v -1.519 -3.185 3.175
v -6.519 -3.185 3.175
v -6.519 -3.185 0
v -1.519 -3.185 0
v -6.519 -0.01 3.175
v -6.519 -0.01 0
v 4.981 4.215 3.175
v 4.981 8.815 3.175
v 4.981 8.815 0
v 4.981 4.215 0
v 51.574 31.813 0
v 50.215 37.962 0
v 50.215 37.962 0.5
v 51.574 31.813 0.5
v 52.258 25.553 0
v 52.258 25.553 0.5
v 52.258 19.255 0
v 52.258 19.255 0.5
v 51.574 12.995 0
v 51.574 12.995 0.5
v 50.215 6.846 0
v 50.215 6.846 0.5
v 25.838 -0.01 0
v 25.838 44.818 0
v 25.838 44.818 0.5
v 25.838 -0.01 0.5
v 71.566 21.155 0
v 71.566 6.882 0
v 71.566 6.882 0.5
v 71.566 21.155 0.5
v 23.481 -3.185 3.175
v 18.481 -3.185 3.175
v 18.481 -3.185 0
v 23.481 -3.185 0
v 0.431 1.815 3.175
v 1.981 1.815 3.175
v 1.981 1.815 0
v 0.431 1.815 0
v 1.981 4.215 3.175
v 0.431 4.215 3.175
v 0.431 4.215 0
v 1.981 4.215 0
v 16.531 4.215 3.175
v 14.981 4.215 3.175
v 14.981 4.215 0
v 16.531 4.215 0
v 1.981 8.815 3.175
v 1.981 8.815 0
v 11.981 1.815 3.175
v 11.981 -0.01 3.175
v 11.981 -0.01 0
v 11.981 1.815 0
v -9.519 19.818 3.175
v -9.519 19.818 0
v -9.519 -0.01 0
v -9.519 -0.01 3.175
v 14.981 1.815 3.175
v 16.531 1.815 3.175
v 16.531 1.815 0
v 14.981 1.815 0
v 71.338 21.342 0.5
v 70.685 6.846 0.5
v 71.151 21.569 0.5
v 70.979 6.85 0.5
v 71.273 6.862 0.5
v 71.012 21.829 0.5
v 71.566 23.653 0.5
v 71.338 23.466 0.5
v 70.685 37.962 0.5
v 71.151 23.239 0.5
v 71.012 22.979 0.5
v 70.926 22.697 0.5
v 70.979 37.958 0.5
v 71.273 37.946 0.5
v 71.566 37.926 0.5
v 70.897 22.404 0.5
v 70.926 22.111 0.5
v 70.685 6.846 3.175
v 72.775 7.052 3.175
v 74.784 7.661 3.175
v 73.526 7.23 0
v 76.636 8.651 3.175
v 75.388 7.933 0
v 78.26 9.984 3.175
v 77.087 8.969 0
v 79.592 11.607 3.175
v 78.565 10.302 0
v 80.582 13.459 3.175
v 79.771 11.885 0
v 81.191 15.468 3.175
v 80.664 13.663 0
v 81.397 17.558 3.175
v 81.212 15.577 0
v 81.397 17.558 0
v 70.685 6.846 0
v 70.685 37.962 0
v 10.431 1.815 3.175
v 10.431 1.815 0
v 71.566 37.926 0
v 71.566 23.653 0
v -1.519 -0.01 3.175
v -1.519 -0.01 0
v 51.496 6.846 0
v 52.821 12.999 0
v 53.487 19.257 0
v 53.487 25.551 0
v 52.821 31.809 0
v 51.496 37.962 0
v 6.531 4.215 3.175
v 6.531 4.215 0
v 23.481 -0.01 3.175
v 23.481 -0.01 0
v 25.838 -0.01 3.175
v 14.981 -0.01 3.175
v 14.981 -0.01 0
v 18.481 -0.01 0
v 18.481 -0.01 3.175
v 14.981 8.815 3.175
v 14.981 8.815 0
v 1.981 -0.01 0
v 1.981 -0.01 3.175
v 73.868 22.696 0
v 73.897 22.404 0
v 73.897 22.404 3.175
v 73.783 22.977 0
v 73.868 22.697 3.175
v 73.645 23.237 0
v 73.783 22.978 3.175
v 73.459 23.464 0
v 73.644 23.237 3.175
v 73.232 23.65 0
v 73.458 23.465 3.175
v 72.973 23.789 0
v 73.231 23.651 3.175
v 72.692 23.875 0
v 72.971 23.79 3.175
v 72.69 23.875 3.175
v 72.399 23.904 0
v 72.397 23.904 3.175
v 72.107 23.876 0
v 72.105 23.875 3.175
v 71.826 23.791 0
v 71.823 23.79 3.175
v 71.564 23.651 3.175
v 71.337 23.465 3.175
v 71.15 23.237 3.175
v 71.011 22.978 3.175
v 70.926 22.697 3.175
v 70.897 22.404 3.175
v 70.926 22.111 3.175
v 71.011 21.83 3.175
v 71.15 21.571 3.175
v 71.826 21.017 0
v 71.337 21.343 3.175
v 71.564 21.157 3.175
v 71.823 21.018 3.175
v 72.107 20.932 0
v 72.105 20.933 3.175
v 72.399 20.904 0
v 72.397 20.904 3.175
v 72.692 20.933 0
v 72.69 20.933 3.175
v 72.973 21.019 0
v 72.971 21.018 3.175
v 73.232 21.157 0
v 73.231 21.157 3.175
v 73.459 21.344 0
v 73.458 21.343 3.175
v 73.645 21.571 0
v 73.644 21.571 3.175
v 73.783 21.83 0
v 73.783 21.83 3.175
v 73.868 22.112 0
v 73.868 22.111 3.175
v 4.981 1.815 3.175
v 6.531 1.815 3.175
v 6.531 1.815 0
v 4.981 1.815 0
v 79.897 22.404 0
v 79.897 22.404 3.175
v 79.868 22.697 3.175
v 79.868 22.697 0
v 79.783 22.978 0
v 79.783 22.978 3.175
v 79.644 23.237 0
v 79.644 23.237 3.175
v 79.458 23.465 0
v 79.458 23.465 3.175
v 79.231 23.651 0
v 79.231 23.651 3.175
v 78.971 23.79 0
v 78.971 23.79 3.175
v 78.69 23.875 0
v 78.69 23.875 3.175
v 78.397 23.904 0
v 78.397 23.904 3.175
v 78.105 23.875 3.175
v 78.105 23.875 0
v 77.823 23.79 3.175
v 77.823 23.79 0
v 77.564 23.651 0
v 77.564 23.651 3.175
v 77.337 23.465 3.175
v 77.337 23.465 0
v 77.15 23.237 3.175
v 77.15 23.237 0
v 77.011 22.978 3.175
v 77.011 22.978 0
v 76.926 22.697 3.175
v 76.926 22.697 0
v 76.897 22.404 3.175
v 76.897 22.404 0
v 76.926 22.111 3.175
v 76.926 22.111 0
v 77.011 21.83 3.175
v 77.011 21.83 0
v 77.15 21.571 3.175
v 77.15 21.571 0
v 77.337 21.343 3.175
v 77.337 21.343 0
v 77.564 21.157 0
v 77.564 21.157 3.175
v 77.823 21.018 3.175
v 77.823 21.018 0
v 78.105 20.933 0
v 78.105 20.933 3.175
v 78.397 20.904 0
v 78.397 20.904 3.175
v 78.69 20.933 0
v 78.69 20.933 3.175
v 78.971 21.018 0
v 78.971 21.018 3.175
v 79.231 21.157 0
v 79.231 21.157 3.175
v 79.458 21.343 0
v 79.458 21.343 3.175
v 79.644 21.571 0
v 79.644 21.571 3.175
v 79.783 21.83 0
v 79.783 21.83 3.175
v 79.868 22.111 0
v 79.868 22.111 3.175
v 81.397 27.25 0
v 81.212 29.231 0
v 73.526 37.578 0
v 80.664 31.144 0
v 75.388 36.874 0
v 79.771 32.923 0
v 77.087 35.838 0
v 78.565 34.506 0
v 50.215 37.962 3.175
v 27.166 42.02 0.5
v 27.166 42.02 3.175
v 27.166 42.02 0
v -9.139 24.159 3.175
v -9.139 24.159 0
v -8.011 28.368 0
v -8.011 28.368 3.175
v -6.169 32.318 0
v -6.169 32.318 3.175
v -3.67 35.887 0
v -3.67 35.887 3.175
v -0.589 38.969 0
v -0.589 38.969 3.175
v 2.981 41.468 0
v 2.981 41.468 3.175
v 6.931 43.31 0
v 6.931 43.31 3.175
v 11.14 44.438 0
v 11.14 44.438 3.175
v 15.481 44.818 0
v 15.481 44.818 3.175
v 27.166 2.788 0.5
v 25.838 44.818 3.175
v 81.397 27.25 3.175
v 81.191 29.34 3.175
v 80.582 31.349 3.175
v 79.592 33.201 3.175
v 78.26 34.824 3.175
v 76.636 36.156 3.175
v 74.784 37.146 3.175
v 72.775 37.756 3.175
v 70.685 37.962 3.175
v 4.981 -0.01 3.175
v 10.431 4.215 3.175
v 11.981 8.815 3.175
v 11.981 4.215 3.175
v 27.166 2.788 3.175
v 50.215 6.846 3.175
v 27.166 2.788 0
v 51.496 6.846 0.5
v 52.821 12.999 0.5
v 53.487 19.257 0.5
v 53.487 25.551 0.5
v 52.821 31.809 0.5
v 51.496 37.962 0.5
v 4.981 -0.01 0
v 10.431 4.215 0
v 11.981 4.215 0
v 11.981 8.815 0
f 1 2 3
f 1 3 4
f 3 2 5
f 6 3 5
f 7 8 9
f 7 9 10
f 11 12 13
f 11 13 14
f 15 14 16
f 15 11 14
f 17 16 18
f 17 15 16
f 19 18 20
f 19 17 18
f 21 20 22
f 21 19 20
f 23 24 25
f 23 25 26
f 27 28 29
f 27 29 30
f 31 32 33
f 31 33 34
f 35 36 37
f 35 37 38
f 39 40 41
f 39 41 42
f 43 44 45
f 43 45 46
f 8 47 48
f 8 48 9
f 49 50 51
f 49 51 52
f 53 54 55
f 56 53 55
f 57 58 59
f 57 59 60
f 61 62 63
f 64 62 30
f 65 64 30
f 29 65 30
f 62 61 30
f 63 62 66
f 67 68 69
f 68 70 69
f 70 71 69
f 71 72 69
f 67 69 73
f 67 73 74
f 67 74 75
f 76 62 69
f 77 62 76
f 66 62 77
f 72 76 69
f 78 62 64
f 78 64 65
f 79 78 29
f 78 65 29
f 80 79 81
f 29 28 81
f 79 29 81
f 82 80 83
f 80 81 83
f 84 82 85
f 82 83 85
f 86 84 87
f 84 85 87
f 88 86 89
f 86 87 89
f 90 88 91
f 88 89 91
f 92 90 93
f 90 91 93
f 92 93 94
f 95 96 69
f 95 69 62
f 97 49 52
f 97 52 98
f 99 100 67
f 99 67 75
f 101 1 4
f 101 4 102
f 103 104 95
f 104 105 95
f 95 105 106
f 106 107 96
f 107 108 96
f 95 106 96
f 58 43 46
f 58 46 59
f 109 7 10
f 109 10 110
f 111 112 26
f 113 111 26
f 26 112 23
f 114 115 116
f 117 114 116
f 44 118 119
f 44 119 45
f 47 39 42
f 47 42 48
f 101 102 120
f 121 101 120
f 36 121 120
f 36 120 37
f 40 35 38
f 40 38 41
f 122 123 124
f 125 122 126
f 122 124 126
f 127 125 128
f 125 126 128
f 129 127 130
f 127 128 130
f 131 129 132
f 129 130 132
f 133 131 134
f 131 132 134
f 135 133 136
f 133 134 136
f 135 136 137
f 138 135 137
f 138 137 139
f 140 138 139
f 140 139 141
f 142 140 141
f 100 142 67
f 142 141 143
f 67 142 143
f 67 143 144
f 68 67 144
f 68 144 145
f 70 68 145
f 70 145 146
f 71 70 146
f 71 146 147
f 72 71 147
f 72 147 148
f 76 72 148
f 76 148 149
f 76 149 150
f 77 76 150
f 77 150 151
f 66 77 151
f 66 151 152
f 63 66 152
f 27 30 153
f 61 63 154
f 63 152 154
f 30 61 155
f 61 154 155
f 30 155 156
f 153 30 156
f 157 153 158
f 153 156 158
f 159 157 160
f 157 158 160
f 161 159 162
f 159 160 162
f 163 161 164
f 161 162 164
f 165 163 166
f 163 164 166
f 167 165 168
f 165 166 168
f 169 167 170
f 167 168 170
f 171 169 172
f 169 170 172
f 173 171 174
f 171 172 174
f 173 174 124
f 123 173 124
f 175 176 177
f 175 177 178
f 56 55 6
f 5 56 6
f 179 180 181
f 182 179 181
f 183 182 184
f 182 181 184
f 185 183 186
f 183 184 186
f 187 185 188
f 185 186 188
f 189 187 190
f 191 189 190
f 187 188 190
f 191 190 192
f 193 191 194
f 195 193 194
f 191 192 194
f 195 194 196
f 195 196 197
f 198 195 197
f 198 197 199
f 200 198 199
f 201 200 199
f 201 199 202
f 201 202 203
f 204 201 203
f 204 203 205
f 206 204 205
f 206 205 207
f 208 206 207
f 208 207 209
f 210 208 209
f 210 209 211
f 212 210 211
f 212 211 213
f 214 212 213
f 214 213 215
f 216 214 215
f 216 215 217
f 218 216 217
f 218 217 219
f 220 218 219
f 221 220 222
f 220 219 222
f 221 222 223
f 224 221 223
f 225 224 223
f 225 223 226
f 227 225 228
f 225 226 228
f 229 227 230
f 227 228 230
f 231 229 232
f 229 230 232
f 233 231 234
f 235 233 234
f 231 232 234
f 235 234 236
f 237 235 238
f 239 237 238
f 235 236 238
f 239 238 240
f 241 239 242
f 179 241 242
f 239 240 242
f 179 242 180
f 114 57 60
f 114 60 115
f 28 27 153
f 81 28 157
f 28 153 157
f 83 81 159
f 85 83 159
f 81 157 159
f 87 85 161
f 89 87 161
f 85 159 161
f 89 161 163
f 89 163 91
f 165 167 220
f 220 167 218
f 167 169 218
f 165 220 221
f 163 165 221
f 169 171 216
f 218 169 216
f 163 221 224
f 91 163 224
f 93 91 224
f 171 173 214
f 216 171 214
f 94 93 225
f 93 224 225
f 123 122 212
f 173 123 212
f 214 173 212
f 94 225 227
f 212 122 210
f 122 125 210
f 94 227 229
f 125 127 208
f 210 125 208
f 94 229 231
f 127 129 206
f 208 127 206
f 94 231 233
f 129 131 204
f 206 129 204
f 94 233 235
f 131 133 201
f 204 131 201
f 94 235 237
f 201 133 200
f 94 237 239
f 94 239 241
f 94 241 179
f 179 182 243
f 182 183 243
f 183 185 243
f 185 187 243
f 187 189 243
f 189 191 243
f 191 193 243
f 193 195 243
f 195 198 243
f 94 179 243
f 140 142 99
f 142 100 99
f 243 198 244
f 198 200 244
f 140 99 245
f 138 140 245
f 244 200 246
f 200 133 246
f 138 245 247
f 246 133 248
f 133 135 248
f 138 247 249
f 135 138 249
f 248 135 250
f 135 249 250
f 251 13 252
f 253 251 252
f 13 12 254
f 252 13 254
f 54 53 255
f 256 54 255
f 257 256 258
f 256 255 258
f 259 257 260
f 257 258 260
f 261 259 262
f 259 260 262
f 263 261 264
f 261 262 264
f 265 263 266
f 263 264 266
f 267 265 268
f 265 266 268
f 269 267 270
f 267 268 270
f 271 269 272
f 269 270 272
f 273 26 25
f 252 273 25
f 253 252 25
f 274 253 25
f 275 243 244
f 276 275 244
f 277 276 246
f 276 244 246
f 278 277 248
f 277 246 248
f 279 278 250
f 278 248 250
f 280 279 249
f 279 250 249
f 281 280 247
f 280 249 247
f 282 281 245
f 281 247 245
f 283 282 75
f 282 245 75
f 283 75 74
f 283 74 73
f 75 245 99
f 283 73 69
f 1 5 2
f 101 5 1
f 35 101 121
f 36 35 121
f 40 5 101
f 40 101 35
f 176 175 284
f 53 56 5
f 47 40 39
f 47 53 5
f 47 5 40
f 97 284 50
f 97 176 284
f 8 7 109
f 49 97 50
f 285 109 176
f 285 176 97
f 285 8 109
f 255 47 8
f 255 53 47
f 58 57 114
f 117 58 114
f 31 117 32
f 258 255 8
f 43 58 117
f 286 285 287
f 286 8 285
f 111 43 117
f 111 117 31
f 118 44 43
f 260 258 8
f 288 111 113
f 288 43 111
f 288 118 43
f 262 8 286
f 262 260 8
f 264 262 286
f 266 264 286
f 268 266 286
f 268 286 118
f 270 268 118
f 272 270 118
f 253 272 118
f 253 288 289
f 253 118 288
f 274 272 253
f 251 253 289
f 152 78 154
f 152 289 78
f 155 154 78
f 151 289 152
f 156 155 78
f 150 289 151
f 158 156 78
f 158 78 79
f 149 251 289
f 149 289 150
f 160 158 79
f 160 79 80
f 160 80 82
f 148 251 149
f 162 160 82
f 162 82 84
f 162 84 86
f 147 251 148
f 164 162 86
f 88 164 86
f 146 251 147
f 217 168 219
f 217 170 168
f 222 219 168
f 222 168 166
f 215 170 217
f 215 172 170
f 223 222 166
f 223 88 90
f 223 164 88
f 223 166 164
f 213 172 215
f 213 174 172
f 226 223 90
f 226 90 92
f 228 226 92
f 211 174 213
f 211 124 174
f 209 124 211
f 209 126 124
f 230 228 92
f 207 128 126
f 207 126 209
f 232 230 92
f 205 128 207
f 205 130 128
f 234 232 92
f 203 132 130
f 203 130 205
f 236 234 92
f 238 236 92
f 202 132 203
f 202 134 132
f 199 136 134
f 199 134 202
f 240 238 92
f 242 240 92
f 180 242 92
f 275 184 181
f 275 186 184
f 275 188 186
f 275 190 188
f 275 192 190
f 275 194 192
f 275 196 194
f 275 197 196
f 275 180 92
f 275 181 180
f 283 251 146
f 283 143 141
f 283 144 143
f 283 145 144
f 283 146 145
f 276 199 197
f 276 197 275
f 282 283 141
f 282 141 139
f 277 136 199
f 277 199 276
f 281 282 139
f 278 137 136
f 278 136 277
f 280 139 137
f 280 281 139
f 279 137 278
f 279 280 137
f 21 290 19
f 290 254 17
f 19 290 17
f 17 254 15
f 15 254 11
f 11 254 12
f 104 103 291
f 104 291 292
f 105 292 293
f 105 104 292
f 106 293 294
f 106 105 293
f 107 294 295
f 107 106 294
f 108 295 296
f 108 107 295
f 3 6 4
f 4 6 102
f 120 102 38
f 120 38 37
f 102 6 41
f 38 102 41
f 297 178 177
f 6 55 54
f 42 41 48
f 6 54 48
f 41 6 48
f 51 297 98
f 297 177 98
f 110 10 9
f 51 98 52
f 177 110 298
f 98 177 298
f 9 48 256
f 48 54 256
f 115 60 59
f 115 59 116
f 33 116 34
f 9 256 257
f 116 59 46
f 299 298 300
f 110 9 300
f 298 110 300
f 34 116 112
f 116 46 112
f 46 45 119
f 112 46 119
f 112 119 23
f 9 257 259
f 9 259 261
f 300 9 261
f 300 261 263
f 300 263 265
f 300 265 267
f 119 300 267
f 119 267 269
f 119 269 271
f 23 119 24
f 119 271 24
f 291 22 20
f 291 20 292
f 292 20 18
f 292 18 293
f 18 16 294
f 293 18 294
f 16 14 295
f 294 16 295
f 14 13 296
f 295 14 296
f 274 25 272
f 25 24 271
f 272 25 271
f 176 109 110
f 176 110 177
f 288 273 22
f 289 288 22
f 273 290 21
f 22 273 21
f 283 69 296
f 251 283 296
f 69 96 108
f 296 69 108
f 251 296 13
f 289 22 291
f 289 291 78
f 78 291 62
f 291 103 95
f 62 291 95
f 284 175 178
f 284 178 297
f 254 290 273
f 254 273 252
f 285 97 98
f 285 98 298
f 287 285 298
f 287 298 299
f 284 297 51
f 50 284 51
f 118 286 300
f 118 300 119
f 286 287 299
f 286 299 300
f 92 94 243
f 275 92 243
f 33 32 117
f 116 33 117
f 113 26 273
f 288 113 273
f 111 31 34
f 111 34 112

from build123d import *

# Parameters (mm, degrees)
BOSS_EXTRUDE1_DEPTH = 3.175
SKETCH2_W           = 5
SKETCH2_H           = 3.175
BOSS_EXTRUDE2_DEPTH = 3.175
CUT_EXTRUDE1_DEPTH  = 93.974208943
CUT_EXTRUDE4_DEPTH  = 0.5
CUT_EXTRUDE5_DEPTH  = 93.974208943
SKETCH6_R           = 1.5
CUT_EXTRUDE6_DEPTH  = 93.974208943


with BuildPart() as part:
    # Sketch1 → Boss-Extrude1 (new body)
    with BuildSketch(Plane.XY):
        with BuildLine():
            Line((70.685056323, 37.961813727), (50.215098345, 37.961813727))
            Line((50.215098345, 37.961813727), (27.166207813, 42.019918966))
            Line((27.166207813, 42.019918966), (25.837789145, 44.817651071))
            Line((25.837789145, 44.817651071), (-9.51883745, 44.817651071))
            Line((-9.51883745, 44.817651071), (-9.51883745, -0.009767361))
            Line((-9.51883745, -0.009767361), (25.837789145, -0.009767361))
            Line((25.837789145, -0.009767361), (27.166207813, 2.787964744))
            Line((27.166207813, 2.787964744), (50.215098345, 6.846069984))
            Line((50.215098345, 6.846069984), (70.685056323, 6.846069984))
            ThreePointArc((70.685056323, 6.846069984), (78.259672242, 9.983578627), (81.397180885, 17.558194546))
            Line((81.397180885, 17.558194546), (81.397180885, 22.403941855))
            Line((81.397180885, 22.403941855), (81.397180885, 27.249689164))
            ThreePointArc((81.397180885, 27.249689164), (78.259672242, 34.824305083), (70.685056323, 37.961813727))
        make_face()
    extrude(amount=BOSS_EXTRUDE1_DEPTH)

    # Sketch2 → Boss-Extrude2 (add)
    with BuildSketch(Plane.XY.offset(3.175)):
        with Locations((-4.01883745, -1.597267361)):
            Rectangle(SKETCH2_W, SKETCH2_H)
        with Locations((20.98116255, -1.597267361)):
            Rectangle(SKETCH2_W, SKETCH2_H)
    extrude(amount=-BOSS_EXTRUDE2_DEPTH)

    # Sketch3 → Cut-Extrude1 (cut, through all)
    with BuildSketch(Plane.XY.offset(3.175)):
        Polygon((4.98116255, -0.009767361), (1.98116255, -0.009767361), (1.98116255, 1.815232639), (0.43116255, 1.815232639), (0.43116255, 4.215232639), (1.98116255, 4.215232639), (1.98116255, 8.815232639), (4.98116255, 8.815232639), (4.98116255, 4.215232639), (6.53116255, 4.215232639), (6.53116255, 1.815232639), (4.98116255, 1.815232639), align=None)
        Polygon((11.98116255, -0.009767361), (11.98116255, 1.815232639), (10.43116255, 1.815232639), (10.43116255, 4.215232639), (11.98116255, 4.215232639), (11.98116255, 8.815232639), (14.98116255, 8.815232639), (14.98116255, 4.215232639), (16.53116255, 4.215232639), (16.53116255, 1.815232639), (14.98116255, 1.815232639), (14.98116255, -0.009767361), align=None)
    extrude(amount=-CUT_EXTRUDE1_DEPTH, mode=Mode.SUBTRACT)

    # Sketch4 → Cut-Extrude4 (cut)
    with BuildSketch(Plane.XY):
        Polygon((25.837789145, 22.403941855), (27.166207813, 22.403941855), (27.166207813, 42.019918966), (25.837789145, 44.817651071), align=None)
        Polygon((27.166207813, 2.787964744), (27.166207813, 22.403941855), (25.837789145, 22.403941855), (25.837789145, -0.009767361), align=None)
        with BuildLine():
            Line((50.215098345, 6.846069984), (51.495792338, 6.846069984))
            ThreePointArc((51.495792338, 6.846069984), (53.570887609, 22.403941855), (51.495792338, 37.961813727))
            Line((51.495792338, 37.961813727), (50.215098345, 37.961813727))
            ThreePointArc((50.215098345, 37.961813727), (52.343297045, 22.403941855), (50.215098345, 6.846069984))
        make_face()
        with BuildLine():
            Line((70.685056323, 37.961813727), (70.685056323, 6.846069984))
            ThreePointArc((70.685056323, 6.846069984), (71.126055593, 6.855151414), (71.56630713, 6.882380308))
            Line((71.56630713, 6.882380308), (71.56630713, 37.925503403))
            ThreePointArc((71.56630713, 37.925503403), (71.126055593, 37.952732296), (70.685056323, 37.961813727))
        make_face()
    extrude(amount=CUT_EXTRUDE4_DEPTH, mode=Mode.SUBTRACT)

    # Sketch5 → Cut-Extrude5 (cut, through all)
    with BuildSketch(Plane.XY.offset(3.175)):
        with BuildLine():
            Line((15.48116255, 44.817651071), (-9.51883745, 44.817651071))
            Line((-9.51883745, 44.817651071), (-9.51883745, 19.817651071))
            ThreePointArc((-9.51883745, 19.817651071), (-2.196506979, 37.495320601), (15.48116255, 44.817651071))
        make_face()
    extrude(amount=-CUT_EXTRUDE5_DEPTH, mode=Mode.SUBTRACT)

    # Sketch6 → Cut-Extrude6 (cut, through all)
    with BuildSketch(Plane.XY.offset(3.175)):
        with Locations((78.397180885, 22.403941855)):
            Circle(SKETCH6_R)
        with Locations((72.397180885, 22.403941855)):
            Circle(SKETCH6_R)
    extrude(amount=-CUT_EXTRUDE6_DEPTH, mode=Mode.SUBTRACT)


solid = part.part
